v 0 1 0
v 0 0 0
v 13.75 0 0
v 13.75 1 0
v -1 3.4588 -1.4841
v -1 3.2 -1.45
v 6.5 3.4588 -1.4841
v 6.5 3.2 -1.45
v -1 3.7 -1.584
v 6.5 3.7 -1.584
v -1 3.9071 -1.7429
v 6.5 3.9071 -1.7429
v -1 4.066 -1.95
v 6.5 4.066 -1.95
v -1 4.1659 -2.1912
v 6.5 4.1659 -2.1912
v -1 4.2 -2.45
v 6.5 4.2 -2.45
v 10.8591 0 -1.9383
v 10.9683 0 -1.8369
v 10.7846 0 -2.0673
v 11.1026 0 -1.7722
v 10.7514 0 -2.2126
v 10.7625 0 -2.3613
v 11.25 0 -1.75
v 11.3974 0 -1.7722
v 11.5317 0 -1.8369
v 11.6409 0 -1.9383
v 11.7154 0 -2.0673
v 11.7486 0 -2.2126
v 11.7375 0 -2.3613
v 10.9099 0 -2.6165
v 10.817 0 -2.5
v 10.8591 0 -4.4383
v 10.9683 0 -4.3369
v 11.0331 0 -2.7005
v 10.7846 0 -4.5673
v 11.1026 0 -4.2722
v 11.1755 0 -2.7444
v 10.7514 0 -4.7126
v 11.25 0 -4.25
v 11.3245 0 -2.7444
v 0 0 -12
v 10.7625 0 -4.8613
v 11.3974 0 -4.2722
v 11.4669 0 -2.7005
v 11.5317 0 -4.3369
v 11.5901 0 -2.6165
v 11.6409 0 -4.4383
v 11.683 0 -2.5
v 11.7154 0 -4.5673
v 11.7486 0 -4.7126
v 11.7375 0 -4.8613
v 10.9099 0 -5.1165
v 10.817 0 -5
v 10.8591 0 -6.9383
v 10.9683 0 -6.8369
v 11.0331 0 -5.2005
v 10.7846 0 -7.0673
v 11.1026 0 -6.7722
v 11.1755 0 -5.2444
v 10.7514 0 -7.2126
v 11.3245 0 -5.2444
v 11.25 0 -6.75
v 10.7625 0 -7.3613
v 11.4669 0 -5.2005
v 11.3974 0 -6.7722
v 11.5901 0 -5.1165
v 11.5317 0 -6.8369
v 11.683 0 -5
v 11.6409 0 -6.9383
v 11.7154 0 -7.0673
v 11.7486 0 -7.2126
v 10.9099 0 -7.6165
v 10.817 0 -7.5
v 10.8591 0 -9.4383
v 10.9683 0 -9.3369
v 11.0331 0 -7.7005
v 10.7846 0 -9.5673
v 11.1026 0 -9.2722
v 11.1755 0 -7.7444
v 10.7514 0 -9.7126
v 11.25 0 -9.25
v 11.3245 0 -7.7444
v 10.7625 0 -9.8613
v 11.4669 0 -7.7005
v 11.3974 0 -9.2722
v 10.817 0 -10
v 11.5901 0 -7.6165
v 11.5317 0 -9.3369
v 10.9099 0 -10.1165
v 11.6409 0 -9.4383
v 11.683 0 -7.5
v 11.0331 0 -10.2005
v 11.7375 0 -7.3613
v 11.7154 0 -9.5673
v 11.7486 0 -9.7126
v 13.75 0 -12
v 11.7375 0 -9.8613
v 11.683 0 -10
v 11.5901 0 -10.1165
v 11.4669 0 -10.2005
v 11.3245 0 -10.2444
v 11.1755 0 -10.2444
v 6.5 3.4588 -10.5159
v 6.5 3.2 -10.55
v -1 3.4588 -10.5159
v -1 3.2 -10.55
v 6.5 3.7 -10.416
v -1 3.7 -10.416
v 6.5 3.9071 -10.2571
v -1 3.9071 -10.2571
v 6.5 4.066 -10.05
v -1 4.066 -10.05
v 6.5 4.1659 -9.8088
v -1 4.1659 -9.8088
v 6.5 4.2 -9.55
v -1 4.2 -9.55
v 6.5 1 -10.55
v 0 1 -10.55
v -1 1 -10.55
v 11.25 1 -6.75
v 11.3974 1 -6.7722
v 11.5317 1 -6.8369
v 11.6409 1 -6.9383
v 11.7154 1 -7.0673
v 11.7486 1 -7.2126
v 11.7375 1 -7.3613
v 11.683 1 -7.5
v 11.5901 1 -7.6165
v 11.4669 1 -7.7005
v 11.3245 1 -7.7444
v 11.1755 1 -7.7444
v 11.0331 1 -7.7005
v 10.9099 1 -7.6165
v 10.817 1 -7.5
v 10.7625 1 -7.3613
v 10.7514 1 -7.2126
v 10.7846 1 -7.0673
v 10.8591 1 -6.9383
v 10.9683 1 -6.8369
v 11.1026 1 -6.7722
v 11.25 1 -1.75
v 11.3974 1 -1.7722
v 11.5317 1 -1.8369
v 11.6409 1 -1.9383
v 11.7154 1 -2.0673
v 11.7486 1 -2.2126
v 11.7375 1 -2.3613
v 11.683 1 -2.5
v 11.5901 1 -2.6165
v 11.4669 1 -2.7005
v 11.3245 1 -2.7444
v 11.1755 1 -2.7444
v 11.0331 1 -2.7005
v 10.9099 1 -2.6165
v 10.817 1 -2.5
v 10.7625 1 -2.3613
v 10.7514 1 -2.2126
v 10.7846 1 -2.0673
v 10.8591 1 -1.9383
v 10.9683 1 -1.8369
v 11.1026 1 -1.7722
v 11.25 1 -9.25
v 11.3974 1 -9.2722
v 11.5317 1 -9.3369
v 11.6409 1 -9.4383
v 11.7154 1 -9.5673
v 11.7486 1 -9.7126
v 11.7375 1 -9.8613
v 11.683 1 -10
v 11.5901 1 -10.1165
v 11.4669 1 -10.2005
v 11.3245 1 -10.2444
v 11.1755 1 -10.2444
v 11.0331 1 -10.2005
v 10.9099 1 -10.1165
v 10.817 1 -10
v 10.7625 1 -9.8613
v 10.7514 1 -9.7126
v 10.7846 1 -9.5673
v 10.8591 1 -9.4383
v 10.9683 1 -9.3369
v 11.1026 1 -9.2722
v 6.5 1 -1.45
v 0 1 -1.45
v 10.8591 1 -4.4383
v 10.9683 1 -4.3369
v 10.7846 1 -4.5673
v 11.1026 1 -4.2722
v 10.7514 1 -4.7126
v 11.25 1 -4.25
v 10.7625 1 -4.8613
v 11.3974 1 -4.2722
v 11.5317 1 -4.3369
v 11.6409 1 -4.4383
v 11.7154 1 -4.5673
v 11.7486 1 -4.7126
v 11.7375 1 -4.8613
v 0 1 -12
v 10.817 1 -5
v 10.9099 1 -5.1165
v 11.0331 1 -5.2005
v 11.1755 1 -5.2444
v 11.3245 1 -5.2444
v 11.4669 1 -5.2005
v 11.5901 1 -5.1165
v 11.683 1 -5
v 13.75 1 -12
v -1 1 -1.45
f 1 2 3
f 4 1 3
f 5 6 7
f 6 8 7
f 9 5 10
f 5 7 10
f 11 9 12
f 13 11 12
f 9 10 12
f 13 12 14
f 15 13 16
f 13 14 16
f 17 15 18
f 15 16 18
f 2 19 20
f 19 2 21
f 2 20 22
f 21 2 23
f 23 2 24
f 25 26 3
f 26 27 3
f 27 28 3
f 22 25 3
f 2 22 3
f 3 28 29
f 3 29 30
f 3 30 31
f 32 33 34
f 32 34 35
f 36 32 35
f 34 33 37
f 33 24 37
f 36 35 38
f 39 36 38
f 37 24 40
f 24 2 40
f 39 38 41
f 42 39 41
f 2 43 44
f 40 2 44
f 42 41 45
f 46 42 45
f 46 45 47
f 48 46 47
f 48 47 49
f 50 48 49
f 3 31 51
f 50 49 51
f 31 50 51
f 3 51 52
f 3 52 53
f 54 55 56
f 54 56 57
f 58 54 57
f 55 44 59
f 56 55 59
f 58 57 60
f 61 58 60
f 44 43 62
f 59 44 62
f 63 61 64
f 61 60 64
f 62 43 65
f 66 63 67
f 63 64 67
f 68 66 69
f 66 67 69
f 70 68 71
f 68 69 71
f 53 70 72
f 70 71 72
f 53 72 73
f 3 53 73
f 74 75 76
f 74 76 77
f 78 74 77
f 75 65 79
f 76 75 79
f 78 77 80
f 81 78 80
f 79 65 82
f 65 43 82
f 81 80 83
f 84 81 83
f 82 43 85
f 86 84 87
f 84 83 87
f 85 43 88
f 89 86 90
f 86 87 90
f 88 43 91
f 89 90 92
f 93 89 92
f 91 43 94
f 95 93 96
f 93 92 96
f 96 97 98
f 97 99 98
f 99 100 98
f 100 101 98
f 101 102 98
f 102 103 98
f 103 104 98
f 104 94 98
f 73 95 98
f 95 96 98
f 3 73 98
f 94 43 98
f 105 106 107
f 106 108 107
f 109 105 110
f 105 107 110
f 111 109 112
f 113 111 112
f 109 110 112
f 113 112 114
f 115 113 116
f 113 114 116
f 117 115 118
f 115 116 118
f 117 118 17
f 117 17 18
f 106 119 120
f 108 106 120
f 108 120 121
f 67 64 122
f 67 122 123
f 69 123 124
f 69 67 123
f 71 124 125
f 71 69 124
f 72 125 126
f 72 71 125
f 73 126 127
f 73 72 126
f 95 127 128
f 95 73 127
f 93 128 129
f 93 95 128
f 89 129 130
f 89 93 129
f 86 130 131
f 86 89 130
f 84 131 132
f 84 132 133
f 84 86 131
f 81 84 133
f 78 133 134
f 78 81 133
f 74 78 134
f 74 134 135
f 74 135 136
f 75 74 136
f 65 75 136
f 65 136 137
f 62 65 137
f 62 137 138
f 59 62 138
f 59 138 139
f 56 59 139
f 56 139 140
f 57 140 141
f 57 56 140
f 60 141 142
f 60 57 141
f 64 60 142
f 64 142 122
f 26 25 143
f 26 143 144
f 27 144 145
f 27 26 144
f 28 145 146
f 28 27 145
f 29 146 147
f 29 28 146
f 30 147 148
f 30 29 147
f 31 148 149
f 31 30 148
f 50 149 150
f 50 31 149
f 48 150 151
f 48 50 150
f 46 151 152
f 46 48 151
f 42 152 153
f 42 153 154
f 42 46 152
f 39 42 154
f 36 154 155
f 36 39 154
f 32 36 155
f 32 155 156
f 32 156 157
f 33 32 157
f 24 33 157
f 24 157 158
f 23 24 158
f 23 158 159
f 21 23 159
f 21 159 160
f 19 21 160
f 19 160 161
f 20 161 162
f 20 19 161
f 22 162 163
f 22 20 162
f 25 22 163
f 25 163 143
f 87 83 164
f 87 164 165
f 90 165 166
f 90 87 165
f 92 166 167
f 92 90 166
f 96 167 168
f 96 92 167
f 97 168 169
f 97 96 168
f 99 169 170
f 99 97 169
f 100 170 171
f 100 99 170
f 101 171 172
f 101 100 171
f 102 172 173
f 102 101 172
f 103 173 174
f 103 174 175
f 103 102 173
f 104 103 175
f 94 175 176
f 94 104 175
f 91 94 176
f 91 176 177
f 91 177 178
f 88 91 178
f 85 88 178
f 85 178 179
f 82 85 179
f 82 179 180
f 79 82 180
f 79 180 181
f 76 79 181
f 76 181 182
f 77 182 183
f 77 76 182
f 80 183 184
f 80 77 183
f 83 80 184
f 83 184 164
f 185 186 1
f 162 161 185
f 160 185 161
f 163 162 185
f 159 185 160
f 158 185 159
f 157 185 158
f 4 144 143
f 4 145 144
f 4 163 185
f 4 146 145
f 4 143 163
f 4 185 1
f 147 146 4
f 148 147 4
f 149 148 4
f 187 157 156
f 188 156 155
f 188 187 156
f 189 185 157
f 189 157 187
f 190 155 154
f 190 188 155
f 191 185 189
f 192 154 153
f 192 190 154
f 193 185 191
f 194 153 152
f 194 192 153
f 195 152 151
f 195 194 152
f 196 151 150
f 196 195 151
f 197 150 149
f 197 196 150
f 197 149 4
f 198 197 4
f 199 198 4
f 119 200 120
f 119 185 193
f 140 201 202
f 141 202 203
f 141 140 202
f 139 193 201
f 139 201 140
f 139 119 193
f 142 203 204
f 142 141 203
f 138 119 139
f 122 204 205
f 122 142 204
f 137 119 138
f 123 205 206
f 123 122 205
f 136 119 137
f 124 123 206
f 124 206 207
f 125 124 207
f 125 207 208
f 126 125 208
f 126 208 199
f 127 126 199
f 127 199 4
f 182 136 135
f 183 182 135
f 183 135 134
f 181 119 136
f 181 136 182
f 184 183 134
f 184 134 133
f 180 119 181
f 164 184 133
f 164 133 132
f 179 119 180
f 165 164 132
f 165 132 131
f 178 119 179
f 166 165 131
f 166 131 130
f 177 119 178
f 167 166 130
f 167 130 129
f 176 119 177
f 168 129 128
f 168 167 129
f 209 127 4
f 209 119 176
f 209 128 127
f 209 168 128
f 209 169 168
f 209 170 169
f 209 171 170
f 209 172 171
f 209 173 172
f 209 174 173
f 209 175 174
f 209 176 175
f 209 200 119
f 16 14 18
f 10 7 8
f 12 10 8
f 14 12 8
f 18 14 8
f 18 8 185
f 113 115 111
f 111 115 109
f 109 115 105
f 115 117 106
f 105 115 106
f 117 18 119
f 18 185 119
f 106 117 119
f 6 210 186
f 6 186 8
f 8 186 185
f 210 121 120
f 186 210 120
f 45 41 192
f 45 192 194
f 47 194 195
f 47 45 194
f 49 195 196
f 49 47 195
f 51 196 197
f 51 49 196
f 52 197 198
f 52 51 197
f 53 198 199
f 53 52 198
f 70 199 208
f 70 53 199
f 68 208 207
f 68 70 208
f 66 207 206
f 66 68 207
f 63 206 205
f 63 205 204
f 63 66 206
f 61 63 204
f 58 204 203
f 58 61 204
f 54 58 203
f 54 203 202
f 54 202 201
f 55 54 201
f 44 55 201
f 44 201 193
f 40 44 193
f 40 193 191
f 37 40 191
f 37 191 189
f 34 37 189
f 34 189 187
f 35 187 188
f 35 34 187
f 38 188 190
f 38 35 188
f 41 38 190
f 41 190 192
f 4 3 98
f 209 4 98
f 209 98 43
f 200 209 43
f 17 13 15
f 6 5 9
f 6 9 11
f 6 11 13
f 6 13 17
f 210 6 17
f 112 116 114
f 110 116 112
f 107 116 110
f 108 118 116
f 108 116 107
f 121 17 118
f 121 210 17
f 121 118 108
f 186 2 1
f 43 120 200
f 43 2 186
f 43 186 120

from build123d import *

# Parameters (mm, degrees)
SKETCH1_R           = 0.5
SKETCH1_W           = 6.5
SKETCH1_H           = 9.1
BOSS_EXTRUDE1_DEPTH = 1
BOSS_EXTRUDE2_START = 1
SKETCH1_3_W         = 1
SKETCH1_3_H         = 9.1
SKETCH1_3_W_2       = 6.5
BOSS_EXTRUDE2_DEPTH = 3.2
FILLET1_R           = 1


with BuildPart() as part:
    # Sketch1 → Boss-Extrude1 (new body)
    # profile 1 of 2: a face of its own
    with BuildSketch(Plane(origin=(0, 0, 0), x_dir=(1, 0, 0), z_dir=(0, 1, 0))):
        Polygon((0, 1.45), (0, 0), (13.75, 0), (13.75, 12), (0, 12), (0, 10.55), (6.5, 10.55), (6.5, 1.45), align=None)
        with Locations(Location((11.25, 2.25, 0), (0, 0, 270))):
            Circle(SKETCH1_R, mode=Mode.SUBTRACT)
        with Locations(Location((11.25, 4.75, 0), (0, 0, 270))):
            Circle(SKETCH1_R, mode=Mode.SUBTRACT)
        with Locations(Location((11.25, 7.25, 0), (0, 0, 270))):
            Circle(SKETCH1_R, mode=Mode.SUBTRACT)
        with Locations(Location((11.25, 9.75, 0), (0, 0, 270))):
            Circle(SKETCH1_R, mode=Mode.SUBTRACT)
    # profile 2 of 2: a face of its own
    with BuildSketch(Plane(origin=(0, 0, 0), x_dir=(1, 0, 0), z_dir=(0, 1, 0))):
        with Locations((3.25, 6)):
            Rectangle(SKETCH1_W, SKETCH1_H)
    extrude(amount=BOSS_EXTRUDE1_DEPTH)

    # Sketch1<3> → Boss-Extrude2 (add)
    with BuildSketch(Plane(origin=(0, 0, 0), x_dir=(1, 0, 0), z_dir=(0, 1, 0)).offset(BOSS_EXTRUDE2_START)):
        with Locations((-0.5, 6)):
            Rectangle(SKETCH1_3_W, SKETCH1_3_H)
        with Locations((3.25, 6)):
            Rectangle(SKETCH1_3_W_2, SKETCH1_3_H)
    extrude(amount=BOSS_EXTRUDE2_DEPTH)

    # Fillet1
    fillet1_edges = [part.edges().sort_by_distance(p)[0] for p in [
        (2.75, 4.2, -10.55),
        (2.75, 4.2, -1.45),
    ]]
    fillet(fillet1_edges, radius=FILLET1_R)


solid = part.part
